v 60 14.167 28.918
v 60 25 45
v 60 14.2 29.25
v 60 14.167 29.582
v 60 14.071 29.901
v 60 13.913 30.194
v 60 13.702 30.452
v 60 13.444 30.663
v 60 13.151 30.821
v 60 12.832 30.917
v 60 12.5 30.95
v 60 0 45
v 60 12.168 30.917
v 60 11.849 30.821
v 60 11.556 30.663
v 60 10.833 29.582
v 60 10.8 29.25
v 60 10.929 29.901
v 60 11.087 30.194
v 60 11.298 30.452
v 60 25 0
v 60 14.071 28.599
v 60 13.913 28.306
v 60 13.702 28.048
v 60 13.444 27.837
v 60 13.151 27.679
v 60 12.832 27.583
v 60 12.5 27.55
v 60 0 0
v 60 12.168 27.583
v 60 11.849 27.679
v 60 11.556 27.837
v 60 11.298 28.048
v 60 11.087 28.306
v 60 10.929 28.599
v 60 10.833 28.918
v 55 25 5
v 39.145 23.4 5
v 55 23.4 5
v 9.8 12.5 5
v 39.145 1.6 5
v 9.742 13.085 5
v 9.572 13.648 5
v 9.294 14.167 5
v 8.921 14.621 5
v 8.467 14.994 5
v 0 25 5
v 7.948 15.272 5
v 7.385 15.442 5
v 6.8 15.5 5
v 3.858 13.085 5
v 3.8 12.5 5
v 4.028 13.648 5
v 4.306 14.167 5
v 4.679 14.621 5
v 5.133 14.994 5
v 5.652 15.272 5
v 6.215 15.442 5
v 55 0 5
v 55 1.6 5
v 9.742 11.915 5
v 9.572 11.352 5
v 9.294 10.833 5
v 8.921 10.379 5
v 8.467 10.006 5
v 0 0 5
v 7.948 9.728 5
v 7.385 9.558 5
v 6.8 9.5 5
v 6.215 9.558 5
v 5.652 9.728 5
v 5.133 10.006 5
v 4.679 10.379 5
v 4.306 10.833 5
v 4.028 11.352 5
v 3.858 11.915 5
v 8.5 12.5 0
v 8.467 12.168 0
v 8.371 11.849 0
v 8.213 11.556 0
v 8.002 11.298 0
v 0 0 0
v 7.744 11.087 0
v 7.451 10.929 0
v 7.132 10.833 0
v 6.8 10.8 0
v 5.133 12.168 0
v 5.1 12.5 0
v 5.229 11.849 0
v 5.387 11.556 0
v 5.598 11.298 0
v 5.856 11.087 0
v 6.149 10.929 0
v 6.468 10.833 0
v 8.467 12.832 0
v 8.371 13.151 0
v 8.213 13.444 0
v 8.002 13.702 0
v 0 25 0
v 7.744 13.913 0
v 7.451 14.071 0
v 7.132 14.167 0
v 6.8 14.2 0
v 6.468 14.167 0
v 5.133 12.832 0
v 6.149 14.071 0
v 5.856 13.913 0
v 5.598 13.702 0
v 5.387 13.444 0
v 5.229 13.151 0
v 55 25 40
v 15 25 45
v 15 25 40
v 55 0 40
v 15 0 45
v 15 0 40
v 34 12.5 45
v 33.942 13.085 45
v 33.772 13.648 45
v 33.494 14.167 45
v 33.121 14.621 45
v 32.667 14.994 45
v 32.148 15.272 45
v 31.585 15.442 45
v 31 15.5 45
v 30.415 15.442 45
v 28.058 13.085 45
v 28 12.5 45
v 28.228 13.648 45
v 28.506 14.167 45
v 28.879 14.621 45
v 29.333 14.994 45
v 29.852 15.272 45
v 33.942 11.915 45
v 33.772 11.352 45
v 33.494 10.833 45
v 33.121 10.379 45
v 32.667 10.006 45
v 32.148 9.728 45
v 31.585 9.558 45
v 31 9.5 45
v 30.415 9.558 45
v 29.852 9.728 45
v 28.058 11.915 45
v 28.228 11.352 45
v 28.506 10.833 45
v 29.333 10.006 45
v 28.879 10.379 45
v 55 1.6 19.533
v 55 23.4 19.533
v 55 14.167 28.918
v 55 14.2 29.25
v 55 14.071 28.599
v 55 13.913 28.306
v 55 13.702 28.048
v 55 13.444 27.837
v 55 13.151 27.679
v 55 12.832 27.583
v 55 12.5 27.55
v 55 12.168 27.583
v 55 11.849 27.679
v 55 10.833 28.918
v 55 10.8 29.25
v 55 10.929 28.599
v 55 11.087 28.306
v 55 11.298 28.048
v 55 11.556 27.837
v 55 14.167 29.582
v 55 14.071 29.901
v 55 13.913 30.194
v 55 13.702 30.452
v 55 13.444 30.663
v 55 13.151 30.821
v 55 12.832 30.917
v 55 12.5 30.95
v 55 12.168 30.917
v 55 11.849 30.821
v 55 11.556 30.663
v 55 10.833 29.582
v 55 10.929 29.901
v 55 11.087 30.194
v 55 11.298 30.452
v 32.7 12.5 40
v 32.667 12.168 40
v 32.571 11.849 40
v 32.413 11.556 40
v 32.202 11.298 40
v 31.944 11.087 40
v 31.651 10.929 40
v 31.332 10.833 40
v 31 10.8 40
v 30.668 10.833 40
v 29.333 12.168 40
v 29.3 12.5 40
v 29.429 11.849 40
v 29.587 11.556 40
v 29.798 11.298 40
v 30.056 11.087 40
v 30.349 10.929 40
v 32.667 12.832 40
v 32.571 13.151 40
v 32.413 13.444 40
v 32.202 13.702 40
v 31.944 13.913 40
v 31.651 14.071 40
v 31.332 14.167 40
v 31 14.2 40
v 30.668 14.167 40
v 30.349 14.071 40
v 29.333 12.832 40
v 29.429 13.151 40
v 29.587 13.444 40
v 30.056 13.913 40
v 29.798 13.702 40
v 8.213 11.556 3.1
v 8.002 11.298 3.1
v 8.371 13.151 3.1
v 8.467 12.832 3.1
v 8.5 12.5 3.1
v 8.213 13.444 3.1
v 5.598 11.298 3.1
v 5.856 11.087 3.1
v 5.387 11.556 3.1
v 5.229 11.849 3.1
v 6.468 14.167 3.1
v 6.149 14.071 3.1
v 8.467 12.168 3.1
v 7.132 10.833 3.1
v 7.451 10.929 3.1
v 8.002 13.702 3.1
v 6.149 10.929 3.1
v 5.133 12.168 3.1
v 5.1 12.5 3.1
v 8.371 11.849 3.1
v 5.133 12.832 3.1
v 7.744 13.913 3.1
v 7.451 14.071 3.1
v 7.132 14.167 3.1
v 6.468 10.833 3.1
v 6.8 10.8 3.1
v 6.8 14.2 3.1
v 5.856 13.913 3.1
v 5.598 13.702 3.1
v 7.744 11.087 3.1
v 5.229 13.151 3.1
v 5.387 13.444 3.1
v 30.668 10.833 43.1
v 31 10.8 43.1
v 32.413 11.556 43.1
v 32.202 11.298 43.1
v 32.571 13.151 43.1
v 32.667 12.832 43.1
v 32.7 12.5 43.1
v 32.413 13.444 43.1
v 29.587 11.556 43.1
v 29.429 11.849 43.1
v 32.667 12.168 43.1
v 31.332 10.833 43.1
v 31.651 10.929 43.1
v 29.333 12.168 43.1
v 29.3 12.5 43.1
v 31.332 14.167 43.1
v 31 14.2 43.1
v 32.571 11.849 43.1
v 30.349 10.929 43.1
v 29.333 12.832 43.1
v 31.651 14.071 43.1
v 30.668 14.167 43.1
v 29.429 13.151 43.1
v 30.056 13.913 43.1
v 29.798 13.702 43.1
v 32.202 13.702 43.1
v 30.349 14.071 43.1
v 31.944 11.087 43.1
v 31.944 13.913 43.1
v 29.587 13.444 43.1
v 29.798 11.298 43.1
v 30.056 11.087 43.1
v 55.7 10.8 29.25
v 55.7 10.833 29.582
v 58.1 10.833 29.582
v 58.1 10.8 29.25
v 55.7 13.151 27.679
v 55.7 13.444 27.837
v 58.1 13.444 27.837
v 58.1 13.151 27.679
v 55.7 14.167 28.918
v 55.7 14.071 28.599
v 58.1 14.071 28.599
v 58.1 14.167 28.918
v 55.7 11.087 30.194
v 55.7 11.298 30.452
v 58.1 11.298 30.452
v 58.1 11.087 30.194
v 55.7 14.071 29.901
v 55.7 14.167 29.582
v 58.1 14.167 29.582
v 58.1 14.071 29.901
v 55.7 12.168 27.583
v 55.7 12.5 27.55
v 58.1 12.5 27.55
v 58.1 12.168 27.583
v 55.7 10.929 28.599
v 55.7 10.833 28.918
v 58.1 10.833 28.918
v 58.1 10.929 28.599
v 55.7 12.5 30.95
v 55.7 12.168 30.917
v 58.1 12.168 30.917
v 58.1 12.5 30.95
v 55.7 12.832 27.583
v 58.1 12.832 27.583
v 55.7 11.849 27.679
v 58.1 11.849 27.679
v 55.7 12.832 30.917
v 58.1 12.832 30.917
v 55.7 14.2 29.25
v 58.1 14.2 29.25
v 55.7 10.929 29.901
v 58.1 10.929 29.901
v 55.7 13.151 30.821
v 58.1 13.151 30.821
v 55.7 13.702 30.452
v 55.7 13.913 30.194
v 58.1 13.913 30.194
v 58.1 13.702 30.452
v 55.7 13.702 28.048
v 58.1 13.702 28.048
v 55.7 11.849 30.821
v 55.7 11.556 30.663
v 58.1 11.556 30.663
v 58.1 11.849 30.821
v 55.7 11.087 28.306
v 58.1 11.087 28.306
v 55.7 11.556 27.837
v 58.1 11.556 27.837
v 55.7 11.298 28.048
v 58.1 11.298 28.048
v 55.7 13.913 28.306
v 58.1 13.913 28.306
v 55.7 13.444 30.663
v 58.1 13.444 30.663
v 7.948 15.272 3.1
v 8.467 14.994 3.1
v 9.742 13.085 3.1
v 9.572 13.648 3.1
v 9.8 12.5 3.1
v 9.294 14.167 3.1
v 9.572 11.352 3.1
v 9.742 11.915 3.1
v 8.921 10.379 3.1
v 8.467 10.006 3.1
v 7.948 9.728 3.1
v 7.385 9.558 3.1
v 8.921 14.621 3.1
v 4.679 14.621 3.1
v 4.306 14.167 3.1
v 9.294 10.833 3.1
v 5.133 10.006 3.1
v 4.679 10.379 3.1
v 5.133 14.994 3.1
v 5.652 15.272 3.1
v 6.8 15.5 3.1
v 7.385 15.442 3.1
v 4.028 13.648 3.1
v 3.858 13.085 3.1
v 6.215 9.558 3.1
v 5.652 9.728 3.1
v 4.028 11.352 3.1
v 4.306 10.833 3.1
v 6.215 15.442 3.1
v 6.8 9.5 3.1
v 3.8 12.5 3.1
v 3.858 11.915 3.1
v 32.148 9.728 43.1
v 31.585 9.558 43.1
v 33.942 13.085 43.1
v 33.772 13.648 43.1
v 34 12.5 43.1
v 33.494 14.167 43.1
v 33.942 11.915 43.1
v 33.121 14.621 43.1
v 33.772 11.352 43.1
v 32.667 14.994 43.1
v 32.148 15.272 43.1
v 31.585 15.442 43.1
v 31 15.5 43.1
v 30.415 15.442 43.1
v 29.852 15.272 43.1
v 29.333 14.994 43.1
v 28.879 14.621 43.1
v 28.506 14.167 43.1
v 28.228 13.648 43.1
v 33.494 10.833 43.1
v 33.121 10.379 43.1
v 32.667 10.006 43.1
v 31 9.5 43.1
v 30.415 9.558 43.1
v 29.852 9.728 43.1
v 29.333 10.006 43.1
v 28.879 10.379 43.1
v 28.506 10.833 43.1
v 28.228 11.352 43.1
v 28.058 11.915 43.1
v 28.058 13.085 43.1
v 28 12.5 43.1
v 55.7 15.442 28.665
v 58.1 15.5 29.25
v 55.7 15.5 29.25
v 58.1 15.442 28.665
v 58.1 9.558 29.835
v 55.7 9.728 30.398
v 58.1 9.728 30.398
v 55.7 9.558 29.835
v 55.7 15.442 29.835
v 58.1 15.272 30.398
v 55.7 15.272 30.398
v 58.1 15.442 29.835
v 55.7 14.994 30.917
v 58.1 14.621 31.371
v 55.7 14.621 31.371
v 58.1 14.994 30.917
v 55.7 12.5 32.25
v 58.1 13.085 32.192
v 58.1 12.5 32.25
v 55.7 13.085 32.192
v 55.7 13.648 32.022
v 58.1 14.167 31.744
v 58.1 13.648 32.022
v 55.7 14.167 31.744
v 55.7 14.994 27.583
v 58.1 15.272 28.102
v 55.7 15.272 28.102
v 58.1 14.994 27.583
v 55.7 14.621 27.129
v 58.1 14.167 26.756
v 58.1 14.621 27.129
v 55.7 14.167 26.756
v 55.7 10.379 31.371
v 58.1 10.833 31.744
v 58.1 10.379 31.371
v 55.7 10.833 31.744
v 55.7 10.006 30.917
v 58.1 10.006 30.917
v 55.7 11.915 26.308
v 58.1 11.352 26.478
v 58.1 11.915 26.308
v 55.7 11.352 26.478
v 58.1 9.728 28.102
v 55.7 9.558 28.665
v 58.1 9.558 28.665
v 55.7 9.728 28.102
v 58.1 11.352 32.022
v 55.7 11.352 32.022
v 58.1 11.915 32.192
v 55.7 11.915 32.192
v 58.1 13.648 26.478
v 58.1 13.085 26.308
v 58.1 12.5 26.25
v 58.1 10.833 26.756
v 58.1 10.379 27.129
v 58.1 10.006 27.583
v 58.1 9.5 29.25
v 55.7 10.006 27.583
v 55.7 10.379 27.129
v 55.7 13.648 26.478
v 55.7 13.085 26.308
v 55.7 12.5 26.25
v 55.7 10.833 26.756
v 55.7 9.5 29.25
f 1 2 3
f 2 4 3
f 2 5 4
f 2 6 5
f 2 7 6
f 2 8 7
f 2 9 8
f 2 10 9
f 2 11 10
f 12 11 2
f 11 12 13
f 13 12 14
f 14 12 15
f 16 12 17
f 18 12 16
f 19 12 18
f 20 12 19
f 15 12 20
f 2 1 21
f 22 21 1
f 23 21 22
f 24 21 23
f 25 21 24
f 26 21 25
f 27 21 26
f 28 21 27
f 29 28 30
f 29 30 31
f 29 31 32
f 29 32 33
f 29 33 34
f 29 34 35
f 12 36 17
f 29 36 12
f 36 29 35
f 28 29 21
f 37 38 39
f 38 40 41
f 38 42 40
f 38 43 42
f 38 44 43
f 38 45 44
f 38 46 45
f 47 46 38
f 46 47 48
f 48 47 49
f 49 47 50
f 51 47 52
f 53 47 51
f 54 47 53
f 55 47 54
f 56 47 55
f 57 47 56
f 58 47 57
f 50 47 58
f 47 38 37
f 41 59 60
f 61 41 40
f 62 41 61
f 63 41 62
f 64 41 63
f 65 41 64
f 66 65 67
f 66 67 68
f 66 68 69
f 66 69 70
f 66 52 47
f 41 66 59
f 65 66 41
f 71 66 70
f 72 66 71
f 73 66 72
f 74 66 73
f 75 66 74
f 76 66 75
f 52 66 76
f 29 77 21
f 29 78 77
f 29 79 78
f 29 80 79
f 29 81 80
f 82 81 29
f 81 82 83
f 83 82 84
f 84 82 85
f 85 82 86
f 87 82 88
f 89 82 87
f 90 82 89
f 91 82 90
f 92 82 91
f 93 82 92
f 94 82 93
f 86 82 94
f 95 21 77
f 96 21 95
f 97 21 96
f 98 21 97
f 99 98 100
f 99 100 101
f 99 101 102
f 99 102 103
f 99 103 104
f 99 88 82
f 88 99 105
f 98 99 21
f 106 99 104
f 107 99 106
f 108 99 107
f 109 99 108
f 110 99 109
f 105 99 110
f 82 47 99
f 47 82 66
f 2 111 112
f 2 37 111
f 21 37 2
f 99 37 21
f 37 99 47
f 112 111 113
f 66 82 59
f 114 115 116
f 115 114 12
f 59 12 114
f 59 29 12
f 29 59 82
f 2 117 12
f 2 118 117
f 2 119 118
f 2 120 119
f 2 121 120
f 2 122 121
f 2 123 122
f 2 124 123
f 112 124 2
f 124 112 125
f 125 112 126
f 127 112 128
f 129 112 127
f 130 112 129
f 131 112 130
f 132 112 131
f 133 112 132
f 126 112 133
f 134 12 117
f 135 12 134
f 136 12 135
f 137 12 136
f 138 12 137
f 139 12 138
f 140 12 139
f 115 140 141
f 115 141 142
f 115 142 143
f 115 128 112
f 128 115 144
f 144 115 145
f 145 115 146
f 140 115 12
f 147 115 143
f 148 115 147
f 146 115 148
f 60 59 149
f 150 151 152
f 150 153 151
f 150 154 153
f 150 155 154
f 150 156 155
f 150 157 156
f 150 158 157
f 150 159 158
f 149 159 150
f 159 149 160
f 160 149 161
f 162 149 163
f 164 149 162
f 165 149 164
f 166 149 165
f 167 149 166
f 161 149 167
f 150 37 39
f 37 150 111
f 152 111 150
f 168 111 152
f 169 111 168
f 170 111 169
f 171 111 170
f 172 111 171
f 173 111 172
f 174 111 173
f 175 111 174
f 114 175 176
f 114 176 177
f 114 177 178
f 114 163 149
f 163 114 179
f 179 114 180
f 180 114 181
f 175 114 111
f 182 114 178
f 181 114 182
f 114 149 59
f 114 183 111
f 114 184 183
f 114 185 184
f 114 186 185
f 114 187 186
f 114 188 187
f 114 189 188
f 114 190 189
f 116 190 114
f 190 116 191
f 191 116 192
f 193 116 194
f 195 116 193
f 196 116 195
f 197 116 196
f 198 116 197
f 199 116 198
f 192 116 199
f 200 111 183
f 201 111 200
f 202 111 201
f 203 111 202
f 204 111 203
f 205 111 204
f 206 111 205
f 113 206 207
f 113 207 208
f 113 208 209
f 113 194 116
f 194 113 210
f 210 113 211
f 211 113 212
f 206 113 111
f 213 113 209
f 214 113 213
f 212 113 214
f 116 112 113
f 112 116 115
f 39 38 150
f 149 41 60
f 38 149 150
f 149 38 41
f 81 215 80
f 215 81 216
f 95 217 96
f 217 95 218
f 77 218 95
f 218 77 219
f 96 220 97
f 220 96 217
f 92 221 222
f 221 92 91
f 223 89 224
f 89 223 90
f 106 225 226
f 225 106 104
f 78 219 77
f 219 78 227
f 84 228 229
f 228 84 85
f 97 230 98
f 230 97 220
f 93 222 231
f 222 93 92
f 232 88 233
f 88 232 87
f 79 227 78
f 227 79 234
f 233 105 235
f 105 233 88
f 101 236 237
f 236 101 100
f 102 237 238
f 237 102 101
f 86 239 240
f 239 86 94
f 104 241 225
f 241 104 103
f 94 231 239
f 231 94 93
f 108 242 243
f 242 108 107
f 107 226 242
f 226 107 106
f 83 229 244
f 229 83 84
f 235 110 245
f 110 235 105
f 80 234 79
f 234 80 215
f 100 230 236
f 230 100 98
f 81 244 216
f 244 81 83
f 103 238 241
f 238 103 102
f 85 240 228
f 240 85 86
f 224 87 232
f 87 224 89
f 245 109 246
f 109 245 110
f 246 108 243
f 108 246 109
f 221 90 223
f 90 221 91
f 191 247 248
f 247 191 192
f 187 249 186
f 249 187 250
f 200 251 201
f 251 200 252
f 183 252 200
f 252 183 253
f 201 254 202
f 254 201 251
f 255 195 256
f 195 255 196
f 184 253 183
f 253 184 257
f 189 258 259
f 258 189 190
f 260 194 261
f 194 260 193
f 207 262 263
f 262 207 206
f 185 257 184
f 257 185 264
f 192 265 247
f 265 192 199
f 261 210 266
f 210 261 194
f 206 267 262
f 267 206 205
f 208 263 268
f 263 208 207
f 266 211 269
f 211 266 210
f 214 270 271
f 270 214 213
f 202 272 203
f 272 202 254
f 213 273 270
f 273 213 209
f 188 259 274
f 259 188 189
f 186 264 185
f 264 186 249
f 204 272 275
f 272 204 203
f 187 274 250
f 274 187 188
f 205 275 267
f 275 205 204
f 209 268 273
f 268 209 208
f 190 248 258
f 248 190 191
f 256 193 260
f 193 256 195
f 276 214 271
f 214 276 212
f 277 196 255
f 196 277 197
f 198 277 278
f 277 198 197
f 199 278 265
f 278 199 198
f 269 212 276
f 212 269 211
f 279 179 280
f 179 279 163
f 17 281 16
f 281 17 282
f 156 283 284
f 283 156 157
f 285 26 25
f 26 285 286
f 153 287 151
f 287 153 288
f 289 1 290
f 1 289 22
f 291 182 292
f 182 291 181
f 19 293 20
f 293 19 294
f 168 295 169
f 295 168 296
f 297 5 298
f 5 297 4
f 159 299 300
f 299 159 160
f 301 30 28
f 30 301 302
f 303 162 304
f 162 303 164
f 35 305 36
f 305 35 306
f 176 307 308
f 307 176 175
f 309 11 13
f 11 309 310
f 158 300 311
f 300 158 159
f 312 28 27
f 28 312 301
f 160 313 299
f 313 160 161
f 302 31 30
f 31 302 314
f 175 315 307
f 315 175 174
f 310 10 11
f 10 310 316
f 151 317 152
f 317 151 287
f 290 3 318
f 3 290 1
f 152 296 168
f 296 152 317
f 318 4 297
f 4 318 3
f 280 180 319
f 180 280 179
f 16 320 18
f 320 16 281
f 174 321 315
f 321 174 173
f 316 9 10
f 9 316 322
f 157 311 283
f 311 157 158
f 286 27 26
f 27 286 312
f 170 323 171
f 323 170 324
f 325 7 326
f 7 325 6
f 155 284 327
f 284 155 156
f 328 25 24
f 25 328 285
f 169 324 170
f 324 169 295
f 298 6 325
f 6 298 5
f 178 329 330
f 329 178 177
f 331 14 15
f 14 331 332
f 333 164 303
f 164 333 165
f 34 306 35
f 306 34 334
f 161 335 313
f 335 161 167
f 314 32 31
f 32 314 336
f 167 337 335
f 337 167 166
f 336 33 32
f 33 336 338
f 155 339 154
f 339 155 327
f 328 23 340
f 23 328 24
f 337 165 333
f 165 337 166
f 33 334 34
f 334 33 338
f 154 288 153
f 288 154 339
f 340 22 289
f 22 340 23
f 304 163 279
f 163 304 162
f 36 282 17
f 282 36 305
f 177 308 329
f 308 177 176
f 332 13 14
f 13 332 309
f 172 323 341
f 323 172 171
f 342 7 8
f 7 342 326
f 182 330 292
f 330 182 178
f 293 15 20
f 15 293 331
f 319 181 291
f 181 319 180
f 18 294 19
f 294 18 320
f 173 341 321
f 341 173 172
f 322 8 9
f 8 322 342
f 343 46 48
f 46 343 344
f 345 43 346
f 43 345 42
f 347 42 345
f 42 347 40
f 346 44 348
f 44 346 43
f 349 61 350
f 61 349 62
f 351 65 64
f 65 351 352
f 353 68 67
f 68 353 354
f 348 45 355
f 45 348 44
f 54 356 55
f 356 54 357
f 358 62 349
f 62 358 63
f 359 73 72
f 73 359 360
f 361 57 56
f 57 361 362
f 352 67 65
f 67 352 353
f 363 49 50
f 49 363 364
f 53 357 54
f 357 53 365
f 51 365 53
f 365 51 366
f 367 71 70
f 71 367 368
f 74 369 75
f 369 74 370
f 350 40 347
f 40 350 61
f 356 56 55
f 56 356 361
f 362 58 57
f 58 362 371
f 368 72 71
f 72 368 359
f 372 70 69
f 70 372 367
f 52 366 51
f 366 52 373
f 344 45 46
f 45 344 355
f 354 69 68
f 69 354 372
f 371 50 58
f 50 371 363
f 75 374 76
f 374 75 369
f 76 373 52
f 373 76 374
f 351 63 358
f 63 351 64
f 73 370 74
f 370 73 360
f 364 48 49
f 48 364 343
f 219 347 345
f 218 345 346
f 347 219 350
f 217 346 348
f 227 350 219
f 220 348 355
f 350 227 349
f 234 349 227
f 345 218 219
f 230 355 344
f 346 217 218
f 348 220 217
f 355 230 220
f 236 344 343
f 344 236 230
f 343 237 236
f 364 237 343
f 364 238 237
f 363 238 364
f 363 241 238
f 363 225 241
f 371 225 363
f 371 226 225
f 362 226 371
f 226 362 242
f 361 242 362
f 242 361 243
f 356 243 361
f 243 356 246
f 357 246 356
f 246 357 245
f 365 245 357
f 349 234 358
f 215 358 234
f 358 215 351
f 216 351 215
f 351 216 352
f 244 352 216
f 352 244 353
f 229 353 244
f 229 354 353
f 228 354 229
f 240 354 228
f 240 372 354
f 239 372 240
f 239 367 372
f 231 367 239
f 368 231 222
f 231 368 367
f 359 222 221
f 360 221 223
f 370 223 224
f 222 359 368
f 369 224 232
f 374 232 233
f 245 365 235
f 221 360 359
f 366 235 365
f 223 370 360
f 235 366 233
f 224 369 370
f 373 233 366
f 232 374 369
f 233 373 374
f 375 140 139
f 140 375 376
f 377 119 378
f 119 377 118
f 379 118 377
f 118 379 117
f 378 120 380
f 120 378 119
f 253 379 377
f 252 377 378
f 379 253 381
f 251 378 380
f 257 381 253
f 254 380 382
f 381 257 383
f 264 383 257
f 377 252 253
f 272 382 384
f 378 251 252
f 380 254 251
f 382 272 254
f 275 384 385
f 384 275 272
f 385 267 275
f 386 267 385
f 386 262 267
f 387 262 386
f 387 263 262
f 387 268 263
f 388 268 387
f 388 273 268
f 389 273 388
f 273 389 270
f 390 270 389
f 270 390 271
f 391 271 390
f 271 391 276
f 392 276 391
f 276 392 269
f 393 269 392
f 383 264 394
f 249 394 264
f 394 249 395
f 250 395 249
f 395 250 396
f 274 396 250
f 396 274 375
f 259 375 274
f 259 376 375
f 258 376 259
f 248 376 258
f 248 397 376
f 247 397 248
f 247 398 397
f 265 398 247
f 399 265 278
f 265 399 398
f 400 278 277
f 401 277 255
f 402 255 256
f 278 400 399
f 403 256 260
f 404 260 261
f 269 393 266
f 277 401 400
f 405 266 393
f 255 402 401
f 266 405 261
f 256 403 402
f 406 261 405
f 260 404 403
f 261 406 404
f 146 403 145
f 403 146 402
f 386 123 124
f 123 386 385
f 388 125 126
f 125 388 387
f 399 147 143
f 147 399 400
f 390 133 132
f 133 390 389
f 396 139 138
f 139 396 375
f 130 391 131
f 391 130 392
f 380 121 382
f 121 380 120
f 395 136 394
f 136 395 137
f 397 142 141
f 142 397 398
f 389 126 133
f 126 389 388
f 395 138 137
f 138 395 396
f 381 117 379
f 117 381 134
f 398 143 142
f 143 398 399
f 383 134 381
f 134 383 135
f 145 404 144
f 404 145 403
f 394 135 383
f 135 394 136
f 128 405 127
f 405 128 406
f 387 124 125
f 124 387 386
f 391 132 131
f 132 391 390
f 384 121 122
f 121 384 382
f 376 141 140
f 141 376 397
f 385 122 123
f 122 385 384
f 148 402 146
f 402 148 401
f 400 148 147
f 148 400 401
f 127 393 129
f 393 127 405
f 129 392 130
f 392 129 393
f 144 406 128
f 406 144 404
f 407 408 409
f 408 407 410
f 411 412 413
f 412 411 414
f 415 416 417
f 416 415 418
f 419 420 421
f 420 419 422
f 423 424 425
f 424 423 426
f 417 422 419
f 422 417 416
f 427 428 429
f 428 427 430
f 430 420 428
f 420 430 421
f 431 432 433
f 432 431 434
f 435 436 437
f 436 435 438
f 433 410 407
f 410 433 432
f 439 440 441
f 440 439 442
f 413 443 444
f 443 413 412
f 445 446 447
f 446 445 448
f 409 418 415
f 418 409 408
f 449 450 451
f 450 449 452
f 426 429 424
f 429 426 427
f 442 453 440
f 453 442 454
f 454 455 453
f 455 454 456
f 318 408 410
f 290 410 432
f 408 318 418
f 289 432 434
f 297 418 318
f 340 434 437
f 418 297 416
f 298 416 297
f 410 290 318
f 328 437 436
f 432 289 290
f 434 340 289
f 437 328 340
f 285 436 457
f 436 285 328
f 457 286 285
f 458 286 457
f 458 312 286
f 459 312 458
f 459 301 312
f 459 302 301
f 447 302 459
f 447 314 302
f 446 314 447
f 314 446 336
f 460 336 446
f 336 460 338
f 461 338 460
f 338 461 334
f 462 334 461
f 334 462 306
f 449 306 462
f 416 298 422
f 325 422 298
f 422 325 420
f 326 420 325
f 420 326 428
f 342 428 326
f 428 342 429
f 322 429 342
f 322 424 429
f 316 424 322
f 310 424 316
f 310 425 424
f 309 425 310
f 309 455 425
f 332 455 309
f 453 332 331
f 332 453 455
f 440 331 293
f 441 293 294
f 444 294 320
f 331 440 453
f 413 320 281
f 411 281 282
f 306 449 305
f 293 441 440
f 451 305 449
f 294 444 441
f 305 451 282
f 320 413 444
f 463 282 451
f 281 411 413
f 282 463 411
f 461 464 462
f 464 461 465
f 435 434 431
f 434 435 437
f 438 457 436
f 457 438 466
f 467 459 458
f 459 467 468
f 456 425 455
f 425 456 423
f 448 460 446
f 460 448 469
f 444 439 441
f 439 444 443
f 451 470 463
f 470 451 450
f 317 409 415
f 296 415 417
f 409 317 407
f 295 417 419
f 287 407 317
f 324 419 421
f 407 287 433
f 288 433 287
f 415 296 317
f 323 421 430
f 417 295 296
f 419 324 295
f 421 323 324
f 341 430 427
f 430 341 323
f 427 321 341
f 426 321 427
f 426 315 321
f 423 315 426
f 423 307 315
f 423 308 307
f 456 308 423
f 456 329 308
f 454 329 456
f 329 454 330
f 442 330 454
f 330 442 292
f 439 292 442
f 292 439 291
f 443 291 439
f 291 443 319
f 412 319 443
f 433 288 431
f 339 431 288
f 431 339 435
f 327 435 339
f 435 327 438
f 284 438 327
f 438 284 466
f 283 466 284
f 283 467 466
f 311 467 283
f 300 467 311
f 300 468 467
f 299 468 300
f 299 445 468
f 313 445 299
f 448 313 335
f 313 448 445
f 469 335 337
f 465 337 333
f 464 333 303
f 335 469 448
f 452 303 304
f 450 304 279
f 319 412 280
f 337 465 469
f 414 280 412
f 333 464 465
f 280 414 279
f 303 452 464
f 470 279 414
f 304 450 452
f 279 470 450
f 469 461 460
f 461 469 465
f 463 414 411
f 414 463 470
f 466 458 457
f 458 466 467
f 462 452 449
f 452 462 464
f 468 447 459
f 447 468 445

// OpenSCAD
$fn = 32;

// ----------------------------------------------------------------------
// Z-bracket: 60 x 25 x 45 mm
// ----------------------------------------------------------------------

// --- parameters (mm) ---
lower_leg = 60;           // lower foot length, X
upper_leg = 40;           // upper foot length, X
bracket_w = 25;           // bracket width, Y
offset_h = 45;            // overall rise, Z
sheet_t = 5;              // plate thickness
hole_d = 3.4;             // clearance for M3
cb_d = 6;                 // counterbore diameter
cb_h = 1.9;               // counterbore depth
rib_len = 17.6;           // gusset leg
rib_sink = 1.6;           // gusset overlap into the plates

module hole_z(px, py, z0) {
  translate([px, py, z0 - 2.5]) cylinder(h = sheet_t + 5, d = hole_d);
}
module hole_x(py, pz) {
  translate([-2.5, py, pz]) rotate([0, 90, 0]) cylinder(h = sheet_t + 5, d = hole_d);
}
module cb_z(px, py, top_z) {
  translate([px, py, top_z - cb_h]) cylinder(h = cb_h + 0.5, d = cb_d);
}
module cb_x(py, pz) {
  translate([sheet_t - cb_h, py, pz]) rotate([0, -90, 0]) cylinder(h = cb_h + 0.5, d = cb_d);
}
module gusset(x0) {
  translate([x0, bracket_w - rib_sink, 0])
    rotate([90, 0, 0])
      linear_extrude(height = bracket_w - 2 * rib_sink)
        polygon(points = [[rib_sink, sheet_t - rib_sink],
                          [rib_sink, sheet_t - rib_sink + rib_len],
                          [-rib_len, sheet_t - rib_sink]]);
}

difference() {
  union() {
    cube([lower_leg, bracket_w, sheet_t]);
    /* web, overlapping the lower foot */
    translate([lower_leg - sheet_t, 0, 0]) cube([sheet_t, bracket_w, offset_h]);
    /* upper foot, sunk into the web */
    translate([lower_leg - sheet_t - upper_leg, 0, offset_h - sheet_t]) cube([upper_leg + sheet_t, bracket_w, sheet_t]);
    gusset(lower_leg - sheet_t);
  }
  hole_z(6.8, 12.5, 0);
  translate([lower_leg - sheet_t - 24, 0, 0]) hole_z(0, 12.5, offset_h - sheet_t);
  translate([lower_leg - sheet_t, 0, 0]) hole_x(12.5, 29.25);
  cb_z(6.8, 12.5, sheet_t);
  translate([lower_leg - sheet_t - 24, 0, 0]) cb_z(0, 12.5, offset_h);
  translate([lower_leg - sheet_t, 0, 0]) cb_x(12.5, 29.25);
}
